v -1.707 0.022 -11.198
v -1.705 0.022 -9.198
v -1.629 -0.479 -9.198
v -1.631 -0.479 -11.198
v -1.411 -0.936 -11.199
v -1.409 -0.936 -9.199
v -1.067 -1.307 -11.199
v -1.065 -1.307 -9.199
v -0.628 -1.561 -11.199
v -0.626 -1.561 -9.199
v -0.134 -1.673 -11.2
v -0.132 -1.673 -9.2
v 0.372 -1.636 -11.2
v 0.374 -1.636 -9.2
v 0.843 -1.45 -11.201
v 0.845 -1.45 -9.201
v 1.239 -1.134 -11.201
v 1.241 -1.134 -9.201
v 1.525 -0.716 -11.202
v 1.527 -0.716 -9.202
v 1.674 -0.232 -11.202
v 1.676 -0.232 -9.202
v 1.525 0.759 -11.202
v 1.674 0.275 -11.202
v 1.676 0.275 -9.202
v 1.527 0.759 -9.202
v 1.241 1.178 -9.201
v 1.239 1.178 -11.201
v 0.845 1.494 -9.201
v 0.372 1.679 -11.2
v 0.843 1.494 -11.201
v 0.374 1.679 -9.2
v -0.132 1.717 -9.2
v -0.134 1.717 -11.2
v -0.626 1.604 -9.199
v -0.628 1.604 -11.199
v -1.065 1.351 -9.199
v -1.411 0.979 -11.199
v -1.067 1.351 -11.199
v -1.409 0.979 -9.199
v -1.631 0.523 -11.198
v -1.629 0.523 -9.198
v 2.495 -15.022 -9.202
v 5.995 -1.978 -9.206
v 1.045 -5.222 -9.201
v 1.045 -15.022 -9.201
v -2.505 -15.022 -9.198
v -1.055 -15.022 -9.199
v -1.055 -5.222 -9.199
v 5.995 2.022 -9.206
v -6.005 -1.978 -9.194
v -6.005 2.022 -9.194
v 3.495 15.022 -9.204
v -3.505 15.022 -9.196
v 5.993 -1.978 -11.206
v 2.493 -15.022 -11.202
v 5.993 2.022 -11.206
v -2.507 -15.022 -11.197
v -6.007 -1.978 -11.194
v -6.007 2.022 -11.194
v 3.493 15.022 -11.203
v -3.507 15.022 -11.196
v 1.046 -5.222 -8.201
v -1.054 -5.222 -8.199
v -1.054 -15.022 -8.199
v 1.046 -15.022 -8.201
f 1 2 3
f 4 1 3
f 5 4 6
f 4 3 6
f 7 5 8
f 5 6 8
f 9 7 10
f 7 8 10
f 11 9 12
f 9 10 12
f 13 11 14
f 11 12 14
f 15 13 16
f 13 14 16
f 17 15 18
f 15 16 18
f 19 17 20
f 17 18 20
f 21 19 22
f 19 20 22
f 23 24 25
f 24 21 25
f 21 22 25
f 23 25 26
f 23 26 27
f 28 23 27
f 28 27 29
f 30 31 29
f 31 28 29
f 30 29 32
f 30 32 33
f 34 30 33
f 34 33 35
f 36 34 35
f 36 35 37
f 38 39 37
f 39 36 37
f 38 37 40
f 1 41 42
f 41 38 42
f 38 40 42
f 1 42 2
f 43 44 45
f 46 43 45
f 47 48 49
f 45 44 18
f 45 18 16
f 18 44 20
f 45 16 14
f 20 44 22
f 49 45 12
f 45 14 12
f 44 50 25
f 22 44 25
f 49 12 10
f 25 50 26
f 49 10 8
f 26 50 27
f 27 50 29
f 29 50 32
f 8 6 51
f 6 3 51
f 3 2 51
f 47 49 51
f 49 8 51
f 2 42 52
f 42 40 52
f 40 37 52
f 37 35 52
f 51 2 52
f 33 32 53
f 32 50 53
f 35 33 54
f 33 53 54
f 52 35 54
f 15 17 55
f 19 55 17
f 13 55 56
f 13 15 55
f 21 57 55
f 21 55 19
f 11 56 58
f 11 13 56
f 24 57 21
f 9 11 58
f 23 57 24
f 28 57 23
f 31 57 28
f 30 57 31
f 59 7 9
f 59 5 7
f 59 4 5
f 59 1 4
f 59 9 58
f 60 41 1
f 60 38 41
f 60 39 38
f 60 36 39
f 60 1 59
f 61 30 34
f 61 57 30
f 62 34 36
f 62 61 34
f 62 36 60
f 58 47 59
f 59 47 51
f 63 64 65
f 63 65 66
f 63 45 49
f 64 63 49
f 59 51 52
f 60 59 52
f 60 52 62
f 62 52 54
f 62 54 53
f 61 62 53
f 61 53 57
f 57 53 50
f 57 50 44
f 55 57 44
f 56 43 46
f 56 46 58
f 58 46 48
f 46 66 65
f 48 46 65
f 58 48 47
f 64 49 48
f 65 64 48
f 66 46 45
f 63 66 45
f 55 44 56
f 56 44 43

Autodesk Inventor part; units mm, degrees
ref_plane "YZ Plane" through (0, 0, 0) normal (1, 0, 0) x (0, 1, 0)
ref_plane "XZ Plane" through (0, 0, 0) normal (0, 1, 0) x (-1, 0, 0)
ref_plane "XY Plane" through (0, 0, 0) normal (0, 0, 1) x (1, 0, 0)
ref_plane "Work Plane2" through (-0.0047, 0, -9.2) normal (-0.001, 0, -1) x (-1, 0, 0.001)
sketch "Sketch2" plane through (-0.0047, 0, -9.2) normal (-0.001, 0, -1) x (-1, 0, 0.001)
  line L0 (6, 2.0218) -> (3.5, 15.0218) projected
  line L1 (6, -1.9782) -> (6, 2.0218) projected
  line L2 (2.5, -15.0218) -> (6, -1.9782) projected
  line L3 (3.5, 15.0218) -> (-3.5, 15.0218) projected
  line L4 (-3.5, 15.0218) -> (-6, 2.0218) projected
  line L5 (-6, 2.0218) -> (-6, -1.9782) projected
  line L6 (-6, -1.9782) -> (-2.5, -15.0218) projected
  line L7 (1.25, -15.0218) -> (2.5, -15.0218) projected
  line L8 (-2.5, -15.0218) -> (-1.25, -15.0218) projected
  line L9 (1.25, -15.0218) -> (-1.25, -15.0218)
  circle A0 centre (0, 0.0218) radius 1.7 projected
  point P0 (0.0047, 0)
extrude "Extrusion1" add sketch "Sketch2" along normal blind 2
sketch "Sketch3" plane through (-0.0047, 0, -9.2) normal (0.001, 0, 1) x (1, 0, -0.001)
  line L0 (1.25, -15.0218) -> (1.25, -5.0218) construction
  line L1 (-1.25, -5.0218) -> (-1.25, -15.0218) construction
  line L2 (2.5, -15.0218) -> (-2.5, -15.0218) projected
  line L3 (1.05, -5.2218) -> (-1.05, -5.2218)
  line L4 (-1.05, -5.2218) -> (-1.05, -15.0218)
  line L5 (-1.05, -15.0218) -> (1.05, -15.0218)
  line L6 (1.05, -15.0218) -> (1.05, -5.2218)
  point P0 (-0.0047, 0)
  point P1 (1.05, -15.0218)
  dimension "d2" = 0.2
  dimension "d3" = 0.2
  dimension "d4" = 0.2
extrude "Extrusion2" add sketch "Sketch3" along normal blind 1
equation "\"d3\" = d2"
equation "\"d4\" = d2"
properties part number "SmallBeltClampCover"
